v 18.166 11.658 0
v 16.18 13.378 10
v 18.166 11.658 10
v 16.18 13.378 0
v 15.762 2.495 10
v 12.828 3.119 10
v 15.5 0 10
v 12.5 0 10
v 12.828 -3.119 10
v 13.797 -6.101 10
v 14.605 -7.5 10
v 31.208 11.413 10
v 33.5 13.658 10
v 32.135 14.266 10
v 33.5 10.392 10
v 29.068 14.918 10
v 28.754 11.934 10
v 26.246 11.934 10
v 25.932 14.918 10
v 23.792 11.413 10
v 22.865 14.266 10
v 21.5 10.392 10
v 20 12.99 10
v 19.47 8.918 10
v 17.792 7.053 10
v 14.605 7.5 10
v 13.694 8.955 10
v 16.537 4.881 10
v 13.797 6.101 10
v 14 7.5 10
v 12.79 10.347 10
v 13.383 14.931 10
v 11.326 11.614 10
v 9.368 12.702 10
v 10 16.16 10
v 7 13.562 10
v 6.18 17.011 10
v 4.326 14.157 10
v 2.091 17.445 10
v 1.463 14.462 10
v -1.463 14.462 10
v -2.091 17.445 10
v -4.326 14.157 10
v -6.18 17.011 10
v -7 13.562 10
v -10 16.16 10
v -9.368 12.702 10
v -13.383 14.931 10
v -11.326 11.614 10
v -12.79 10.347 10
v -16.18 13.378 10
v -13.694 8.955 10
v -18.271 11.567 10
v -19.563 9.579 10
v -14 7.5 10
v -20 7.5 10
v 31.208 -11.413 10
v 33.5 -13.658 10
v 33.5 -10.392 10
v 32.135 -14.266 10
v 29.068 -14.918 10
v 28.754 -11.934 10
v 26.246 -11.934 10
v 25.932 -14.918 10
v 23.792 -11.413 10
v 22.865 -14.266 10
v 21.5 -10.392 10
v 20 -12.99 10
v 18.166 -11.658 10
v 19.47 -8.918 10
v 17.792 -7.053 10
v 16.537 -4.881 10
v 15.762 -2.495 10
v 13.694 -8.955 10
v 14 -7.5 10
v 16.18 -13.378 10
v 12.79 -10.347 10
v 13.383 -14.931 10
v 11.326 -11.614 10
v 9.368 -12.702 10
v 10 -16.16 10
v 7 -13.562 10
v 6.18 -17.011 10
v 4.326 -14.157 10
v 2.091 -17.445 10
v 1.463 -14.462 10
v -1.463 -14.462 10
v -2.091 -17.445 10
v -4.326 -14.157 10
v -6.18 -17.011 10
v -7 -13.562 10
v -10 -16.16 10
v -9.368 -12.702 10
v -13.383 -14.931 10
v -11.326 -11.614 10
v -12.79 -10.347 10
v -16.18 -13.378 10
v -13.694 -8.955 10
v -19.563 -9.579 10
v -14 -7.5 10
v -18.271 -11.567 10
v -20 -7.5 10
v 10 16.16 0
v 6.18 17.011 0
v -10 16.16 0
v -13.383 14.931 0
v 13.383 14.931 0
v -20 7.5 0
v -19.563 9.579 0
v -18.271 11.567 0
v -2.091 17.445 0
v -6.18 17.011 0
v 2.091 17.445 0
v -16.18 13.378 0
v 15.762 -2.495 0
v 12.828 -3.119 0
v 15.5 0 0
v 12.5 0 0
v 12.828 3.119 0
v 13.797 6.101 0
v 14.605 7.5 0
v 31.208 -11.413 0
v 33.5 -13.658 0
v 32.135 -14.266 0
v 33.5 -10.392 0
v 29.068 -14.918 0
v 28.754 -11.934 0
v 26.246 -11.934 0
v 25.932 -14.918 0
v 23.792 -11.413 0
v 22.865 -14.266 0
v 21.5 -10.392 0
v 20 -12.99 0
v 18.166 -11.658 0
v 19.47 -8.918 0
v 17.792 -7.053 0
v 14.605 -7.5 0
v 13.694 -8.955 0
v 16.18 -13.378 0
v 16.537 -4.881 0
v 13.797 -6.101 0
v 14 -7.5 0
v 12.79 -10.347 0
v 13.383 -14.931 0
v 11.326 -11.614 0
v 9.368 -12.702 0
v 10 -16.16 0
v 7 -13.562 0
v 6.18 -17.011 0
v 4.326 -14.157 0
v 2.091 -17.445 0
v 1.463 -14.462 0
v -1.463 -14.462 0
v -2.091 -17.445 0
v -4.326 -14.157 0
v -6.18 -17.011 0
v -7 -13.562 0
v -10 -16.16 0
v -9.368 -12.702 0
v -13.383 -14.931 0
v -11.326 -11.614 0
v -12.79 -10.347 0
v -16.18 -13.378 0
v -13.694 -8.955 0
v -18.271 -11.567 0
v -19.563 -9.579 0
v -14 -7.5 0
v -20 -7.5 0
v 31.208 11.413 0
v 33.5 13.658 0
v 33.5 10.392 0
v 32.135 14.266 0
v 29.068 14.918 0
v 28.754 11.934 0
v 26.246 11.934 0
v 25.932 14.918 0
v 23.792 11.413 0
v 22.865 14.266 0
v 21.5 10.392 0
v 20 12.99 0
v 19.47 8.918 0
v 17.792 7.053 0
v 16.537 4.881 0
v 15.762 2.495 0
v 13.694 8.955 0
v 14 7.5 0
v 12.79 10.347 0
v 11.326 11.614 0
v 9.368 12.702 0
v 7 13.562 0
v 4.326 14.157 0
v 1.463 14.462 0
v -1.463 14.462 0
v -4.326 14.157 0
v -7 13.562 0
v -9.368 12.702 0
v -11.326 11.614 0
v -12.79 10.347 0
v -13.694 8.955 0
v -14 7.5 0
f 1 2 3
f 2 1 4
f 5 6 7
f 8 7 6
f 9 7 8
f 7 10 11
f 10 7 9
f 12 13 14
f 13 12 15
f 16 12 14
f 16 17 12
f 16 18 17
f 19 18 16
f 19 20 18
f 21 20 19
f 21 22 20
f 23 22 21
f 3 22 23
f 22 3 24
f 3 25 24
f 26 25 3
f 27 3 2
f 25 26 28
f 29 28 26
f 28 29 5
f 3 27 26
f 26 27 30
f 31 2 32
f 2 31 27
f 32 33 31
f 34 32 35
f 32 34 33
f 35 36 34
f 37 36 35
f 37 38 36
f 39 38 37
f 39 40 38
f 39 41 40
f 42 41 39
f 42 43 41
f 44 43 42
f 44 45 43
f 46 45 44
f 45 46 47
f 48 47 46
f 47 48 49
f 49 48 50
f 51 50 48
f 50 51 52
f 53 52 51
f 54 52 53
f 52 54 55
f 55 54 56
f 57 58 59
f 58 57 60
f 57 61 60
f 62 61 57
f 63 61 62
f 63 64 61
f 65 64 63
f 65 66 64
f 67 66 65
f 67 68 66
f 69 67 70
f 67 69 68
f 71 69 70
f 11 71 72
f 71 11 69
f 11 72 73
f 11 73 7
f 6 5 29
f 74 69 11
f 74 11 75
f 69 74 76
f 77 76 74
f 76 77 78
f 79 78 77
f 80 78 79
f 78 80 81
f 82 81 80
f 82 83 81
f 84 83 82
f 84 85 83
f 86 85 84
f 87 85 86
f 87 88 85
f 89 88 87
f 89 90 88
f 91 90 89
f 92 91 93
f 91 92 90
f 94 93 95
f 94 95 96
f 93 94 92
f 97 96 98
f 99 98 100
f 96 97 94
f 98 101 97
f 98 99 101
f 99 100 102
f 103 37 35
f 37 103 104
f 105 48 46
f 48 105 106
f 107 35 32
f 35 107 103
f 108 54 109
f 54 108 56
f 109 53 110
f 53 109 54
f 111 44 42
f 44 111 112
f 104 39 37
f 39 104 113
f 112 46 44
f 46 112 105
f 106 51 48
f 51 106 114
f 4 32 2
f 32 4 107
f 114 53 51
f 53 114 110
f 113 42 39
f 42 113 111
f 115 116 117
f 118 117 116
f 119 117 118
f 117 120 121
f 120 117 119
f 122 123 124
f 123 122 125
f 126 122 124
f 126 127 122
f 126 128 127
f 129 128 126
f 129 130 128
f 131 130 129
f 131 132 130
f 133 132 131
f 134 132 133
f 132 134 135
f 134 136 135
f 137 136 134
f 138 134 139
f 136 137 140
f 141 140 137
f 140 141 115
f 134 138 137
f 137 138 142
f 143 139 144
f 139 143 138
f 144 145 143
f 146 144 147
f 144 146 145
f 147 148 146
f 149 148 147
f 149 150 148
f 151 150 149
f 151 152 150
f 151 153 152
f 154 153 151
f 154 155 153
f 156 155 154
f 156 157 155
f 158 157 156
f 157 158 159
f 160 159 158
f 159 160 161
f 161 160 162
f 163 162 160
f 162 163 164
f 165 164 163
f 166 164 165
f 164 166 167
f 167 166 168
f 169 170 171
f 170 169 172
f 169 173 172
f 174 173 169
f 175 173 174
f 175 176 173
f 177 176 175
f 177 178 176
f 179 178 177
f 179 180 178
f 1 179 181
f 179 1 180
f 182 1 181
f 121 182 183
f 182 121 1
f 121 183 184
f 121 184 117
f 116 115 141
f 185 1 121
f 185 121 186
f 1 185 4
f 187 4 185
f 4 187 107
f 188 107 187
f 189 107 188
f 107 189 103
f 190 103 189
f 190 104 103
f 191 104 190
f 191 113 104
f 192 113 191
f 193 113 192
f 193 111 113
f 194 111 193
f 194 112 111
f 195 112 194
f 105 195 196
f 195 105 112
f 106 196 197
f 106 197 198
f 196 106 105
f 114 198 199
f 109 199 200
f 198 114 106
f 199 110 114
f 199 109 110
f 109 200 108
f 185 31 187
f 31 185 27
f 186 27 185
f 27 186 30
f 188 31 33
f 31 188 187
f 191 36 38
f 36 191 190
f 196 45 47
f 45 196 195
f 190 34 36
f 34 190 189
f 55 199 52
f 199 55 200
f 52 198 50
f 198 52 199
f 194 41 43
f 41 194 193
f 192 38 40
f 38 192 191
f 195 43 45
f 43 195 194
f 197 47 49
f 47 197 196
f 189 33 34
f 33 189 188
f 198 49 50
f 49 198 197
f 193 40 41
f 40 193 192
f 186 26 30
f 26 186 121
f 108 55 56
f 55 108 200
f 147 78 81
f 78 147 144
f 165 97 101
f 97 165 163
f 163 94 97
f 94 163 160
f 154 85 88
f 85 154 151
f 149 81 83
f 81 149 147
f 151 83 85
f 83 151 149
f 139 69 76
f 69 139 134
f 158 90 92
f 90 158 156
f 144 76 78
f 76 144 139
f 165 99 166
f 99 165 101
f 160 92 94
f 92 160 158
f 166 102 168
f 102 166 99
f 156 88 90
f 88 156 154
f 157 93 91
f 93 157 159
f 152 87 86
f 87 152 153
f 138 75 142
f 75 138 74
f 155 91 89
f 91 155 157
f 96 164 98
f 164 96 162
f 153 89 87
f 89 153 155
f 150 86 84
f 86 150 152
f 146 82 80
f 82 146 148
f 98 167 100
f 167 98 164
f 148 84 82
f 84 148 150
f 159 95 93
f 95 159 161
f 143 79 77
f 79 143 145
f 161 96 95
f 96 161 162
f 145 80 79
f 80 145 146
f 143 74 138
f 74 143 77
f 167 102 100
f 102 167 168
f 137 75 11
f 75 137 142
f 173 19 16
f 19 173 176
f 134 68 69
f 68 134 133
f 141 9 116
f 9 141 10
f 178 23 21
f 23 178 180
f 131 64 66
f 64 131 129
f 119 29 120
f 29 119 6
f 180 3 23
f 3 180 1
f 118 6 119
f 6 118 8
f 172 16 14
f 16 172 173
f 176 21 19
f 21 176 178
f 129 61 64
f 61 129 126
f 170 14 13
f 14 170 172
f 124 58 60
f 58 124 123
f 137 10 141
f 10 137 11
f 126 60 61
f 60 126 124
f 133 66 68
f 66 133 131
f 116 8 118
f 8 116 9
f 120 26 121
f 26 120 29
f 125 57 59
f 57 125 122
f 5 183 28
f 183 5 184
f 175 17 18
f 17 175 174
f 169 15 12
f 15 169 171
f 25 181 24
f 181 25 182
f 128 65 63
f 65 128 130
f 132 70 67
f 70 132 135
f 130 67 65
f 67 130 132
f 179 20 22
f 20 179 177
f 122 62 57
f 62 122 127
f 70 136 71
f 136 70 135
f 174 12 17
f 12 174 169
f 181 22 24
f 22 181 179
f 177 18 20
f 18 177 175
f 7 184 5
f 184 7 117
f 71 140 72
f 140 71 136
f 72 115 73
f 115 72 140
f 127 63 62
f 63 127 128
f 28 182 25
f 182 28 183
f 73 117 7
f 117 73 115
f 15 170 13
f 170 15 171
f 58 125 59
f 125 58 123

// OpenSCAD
BendRaduis=20;
height=10;
thickness=3;
Gap=15;

module TopJaw(){
	scale([1,.5,1])difference(){
		cylinder(r=BendRaduis,h=height);
		cylinder(r=BendRaduis-thickness*2,h=height);
		translate([-BendRaduis,0,-height])cube([BendRaduis*3,BendRaduis*3,height*3]);
	}
}
module BottomJaw(){
	difference(){
		scale([1,.5,1])cylinder(r=BendRaduis,h=height);
		scale([1,.5,1])cylinder(r=BendRaduis-thickness*2,h=height);
		translate([-BendRaduis,-BendRaduis*3,-height])cube([BendRaduis*3,BendRaduis*3,height*3]);
	}
}
module clip(){
	difference(){
		union(){
			translate([0,Gap/2,0])BottomJaw();
			translate([0,-Gap/2,0])TopJaw();
			translate([BendRaduis+Gap/2,0,0])cylinder(r=.75*BendRaduis,h=height);
		}
			
		translate([BendRaduis+Gap/2,0,0])cylinder(r=.75*BendRaduis-thickness,h=height);
		translate([1.3*BendRaduis+Gap/2,-BendRaduis*2,-height])cube([BendRaduis*4,BendRaduis*4,height*3]);

	}
}
clip();
